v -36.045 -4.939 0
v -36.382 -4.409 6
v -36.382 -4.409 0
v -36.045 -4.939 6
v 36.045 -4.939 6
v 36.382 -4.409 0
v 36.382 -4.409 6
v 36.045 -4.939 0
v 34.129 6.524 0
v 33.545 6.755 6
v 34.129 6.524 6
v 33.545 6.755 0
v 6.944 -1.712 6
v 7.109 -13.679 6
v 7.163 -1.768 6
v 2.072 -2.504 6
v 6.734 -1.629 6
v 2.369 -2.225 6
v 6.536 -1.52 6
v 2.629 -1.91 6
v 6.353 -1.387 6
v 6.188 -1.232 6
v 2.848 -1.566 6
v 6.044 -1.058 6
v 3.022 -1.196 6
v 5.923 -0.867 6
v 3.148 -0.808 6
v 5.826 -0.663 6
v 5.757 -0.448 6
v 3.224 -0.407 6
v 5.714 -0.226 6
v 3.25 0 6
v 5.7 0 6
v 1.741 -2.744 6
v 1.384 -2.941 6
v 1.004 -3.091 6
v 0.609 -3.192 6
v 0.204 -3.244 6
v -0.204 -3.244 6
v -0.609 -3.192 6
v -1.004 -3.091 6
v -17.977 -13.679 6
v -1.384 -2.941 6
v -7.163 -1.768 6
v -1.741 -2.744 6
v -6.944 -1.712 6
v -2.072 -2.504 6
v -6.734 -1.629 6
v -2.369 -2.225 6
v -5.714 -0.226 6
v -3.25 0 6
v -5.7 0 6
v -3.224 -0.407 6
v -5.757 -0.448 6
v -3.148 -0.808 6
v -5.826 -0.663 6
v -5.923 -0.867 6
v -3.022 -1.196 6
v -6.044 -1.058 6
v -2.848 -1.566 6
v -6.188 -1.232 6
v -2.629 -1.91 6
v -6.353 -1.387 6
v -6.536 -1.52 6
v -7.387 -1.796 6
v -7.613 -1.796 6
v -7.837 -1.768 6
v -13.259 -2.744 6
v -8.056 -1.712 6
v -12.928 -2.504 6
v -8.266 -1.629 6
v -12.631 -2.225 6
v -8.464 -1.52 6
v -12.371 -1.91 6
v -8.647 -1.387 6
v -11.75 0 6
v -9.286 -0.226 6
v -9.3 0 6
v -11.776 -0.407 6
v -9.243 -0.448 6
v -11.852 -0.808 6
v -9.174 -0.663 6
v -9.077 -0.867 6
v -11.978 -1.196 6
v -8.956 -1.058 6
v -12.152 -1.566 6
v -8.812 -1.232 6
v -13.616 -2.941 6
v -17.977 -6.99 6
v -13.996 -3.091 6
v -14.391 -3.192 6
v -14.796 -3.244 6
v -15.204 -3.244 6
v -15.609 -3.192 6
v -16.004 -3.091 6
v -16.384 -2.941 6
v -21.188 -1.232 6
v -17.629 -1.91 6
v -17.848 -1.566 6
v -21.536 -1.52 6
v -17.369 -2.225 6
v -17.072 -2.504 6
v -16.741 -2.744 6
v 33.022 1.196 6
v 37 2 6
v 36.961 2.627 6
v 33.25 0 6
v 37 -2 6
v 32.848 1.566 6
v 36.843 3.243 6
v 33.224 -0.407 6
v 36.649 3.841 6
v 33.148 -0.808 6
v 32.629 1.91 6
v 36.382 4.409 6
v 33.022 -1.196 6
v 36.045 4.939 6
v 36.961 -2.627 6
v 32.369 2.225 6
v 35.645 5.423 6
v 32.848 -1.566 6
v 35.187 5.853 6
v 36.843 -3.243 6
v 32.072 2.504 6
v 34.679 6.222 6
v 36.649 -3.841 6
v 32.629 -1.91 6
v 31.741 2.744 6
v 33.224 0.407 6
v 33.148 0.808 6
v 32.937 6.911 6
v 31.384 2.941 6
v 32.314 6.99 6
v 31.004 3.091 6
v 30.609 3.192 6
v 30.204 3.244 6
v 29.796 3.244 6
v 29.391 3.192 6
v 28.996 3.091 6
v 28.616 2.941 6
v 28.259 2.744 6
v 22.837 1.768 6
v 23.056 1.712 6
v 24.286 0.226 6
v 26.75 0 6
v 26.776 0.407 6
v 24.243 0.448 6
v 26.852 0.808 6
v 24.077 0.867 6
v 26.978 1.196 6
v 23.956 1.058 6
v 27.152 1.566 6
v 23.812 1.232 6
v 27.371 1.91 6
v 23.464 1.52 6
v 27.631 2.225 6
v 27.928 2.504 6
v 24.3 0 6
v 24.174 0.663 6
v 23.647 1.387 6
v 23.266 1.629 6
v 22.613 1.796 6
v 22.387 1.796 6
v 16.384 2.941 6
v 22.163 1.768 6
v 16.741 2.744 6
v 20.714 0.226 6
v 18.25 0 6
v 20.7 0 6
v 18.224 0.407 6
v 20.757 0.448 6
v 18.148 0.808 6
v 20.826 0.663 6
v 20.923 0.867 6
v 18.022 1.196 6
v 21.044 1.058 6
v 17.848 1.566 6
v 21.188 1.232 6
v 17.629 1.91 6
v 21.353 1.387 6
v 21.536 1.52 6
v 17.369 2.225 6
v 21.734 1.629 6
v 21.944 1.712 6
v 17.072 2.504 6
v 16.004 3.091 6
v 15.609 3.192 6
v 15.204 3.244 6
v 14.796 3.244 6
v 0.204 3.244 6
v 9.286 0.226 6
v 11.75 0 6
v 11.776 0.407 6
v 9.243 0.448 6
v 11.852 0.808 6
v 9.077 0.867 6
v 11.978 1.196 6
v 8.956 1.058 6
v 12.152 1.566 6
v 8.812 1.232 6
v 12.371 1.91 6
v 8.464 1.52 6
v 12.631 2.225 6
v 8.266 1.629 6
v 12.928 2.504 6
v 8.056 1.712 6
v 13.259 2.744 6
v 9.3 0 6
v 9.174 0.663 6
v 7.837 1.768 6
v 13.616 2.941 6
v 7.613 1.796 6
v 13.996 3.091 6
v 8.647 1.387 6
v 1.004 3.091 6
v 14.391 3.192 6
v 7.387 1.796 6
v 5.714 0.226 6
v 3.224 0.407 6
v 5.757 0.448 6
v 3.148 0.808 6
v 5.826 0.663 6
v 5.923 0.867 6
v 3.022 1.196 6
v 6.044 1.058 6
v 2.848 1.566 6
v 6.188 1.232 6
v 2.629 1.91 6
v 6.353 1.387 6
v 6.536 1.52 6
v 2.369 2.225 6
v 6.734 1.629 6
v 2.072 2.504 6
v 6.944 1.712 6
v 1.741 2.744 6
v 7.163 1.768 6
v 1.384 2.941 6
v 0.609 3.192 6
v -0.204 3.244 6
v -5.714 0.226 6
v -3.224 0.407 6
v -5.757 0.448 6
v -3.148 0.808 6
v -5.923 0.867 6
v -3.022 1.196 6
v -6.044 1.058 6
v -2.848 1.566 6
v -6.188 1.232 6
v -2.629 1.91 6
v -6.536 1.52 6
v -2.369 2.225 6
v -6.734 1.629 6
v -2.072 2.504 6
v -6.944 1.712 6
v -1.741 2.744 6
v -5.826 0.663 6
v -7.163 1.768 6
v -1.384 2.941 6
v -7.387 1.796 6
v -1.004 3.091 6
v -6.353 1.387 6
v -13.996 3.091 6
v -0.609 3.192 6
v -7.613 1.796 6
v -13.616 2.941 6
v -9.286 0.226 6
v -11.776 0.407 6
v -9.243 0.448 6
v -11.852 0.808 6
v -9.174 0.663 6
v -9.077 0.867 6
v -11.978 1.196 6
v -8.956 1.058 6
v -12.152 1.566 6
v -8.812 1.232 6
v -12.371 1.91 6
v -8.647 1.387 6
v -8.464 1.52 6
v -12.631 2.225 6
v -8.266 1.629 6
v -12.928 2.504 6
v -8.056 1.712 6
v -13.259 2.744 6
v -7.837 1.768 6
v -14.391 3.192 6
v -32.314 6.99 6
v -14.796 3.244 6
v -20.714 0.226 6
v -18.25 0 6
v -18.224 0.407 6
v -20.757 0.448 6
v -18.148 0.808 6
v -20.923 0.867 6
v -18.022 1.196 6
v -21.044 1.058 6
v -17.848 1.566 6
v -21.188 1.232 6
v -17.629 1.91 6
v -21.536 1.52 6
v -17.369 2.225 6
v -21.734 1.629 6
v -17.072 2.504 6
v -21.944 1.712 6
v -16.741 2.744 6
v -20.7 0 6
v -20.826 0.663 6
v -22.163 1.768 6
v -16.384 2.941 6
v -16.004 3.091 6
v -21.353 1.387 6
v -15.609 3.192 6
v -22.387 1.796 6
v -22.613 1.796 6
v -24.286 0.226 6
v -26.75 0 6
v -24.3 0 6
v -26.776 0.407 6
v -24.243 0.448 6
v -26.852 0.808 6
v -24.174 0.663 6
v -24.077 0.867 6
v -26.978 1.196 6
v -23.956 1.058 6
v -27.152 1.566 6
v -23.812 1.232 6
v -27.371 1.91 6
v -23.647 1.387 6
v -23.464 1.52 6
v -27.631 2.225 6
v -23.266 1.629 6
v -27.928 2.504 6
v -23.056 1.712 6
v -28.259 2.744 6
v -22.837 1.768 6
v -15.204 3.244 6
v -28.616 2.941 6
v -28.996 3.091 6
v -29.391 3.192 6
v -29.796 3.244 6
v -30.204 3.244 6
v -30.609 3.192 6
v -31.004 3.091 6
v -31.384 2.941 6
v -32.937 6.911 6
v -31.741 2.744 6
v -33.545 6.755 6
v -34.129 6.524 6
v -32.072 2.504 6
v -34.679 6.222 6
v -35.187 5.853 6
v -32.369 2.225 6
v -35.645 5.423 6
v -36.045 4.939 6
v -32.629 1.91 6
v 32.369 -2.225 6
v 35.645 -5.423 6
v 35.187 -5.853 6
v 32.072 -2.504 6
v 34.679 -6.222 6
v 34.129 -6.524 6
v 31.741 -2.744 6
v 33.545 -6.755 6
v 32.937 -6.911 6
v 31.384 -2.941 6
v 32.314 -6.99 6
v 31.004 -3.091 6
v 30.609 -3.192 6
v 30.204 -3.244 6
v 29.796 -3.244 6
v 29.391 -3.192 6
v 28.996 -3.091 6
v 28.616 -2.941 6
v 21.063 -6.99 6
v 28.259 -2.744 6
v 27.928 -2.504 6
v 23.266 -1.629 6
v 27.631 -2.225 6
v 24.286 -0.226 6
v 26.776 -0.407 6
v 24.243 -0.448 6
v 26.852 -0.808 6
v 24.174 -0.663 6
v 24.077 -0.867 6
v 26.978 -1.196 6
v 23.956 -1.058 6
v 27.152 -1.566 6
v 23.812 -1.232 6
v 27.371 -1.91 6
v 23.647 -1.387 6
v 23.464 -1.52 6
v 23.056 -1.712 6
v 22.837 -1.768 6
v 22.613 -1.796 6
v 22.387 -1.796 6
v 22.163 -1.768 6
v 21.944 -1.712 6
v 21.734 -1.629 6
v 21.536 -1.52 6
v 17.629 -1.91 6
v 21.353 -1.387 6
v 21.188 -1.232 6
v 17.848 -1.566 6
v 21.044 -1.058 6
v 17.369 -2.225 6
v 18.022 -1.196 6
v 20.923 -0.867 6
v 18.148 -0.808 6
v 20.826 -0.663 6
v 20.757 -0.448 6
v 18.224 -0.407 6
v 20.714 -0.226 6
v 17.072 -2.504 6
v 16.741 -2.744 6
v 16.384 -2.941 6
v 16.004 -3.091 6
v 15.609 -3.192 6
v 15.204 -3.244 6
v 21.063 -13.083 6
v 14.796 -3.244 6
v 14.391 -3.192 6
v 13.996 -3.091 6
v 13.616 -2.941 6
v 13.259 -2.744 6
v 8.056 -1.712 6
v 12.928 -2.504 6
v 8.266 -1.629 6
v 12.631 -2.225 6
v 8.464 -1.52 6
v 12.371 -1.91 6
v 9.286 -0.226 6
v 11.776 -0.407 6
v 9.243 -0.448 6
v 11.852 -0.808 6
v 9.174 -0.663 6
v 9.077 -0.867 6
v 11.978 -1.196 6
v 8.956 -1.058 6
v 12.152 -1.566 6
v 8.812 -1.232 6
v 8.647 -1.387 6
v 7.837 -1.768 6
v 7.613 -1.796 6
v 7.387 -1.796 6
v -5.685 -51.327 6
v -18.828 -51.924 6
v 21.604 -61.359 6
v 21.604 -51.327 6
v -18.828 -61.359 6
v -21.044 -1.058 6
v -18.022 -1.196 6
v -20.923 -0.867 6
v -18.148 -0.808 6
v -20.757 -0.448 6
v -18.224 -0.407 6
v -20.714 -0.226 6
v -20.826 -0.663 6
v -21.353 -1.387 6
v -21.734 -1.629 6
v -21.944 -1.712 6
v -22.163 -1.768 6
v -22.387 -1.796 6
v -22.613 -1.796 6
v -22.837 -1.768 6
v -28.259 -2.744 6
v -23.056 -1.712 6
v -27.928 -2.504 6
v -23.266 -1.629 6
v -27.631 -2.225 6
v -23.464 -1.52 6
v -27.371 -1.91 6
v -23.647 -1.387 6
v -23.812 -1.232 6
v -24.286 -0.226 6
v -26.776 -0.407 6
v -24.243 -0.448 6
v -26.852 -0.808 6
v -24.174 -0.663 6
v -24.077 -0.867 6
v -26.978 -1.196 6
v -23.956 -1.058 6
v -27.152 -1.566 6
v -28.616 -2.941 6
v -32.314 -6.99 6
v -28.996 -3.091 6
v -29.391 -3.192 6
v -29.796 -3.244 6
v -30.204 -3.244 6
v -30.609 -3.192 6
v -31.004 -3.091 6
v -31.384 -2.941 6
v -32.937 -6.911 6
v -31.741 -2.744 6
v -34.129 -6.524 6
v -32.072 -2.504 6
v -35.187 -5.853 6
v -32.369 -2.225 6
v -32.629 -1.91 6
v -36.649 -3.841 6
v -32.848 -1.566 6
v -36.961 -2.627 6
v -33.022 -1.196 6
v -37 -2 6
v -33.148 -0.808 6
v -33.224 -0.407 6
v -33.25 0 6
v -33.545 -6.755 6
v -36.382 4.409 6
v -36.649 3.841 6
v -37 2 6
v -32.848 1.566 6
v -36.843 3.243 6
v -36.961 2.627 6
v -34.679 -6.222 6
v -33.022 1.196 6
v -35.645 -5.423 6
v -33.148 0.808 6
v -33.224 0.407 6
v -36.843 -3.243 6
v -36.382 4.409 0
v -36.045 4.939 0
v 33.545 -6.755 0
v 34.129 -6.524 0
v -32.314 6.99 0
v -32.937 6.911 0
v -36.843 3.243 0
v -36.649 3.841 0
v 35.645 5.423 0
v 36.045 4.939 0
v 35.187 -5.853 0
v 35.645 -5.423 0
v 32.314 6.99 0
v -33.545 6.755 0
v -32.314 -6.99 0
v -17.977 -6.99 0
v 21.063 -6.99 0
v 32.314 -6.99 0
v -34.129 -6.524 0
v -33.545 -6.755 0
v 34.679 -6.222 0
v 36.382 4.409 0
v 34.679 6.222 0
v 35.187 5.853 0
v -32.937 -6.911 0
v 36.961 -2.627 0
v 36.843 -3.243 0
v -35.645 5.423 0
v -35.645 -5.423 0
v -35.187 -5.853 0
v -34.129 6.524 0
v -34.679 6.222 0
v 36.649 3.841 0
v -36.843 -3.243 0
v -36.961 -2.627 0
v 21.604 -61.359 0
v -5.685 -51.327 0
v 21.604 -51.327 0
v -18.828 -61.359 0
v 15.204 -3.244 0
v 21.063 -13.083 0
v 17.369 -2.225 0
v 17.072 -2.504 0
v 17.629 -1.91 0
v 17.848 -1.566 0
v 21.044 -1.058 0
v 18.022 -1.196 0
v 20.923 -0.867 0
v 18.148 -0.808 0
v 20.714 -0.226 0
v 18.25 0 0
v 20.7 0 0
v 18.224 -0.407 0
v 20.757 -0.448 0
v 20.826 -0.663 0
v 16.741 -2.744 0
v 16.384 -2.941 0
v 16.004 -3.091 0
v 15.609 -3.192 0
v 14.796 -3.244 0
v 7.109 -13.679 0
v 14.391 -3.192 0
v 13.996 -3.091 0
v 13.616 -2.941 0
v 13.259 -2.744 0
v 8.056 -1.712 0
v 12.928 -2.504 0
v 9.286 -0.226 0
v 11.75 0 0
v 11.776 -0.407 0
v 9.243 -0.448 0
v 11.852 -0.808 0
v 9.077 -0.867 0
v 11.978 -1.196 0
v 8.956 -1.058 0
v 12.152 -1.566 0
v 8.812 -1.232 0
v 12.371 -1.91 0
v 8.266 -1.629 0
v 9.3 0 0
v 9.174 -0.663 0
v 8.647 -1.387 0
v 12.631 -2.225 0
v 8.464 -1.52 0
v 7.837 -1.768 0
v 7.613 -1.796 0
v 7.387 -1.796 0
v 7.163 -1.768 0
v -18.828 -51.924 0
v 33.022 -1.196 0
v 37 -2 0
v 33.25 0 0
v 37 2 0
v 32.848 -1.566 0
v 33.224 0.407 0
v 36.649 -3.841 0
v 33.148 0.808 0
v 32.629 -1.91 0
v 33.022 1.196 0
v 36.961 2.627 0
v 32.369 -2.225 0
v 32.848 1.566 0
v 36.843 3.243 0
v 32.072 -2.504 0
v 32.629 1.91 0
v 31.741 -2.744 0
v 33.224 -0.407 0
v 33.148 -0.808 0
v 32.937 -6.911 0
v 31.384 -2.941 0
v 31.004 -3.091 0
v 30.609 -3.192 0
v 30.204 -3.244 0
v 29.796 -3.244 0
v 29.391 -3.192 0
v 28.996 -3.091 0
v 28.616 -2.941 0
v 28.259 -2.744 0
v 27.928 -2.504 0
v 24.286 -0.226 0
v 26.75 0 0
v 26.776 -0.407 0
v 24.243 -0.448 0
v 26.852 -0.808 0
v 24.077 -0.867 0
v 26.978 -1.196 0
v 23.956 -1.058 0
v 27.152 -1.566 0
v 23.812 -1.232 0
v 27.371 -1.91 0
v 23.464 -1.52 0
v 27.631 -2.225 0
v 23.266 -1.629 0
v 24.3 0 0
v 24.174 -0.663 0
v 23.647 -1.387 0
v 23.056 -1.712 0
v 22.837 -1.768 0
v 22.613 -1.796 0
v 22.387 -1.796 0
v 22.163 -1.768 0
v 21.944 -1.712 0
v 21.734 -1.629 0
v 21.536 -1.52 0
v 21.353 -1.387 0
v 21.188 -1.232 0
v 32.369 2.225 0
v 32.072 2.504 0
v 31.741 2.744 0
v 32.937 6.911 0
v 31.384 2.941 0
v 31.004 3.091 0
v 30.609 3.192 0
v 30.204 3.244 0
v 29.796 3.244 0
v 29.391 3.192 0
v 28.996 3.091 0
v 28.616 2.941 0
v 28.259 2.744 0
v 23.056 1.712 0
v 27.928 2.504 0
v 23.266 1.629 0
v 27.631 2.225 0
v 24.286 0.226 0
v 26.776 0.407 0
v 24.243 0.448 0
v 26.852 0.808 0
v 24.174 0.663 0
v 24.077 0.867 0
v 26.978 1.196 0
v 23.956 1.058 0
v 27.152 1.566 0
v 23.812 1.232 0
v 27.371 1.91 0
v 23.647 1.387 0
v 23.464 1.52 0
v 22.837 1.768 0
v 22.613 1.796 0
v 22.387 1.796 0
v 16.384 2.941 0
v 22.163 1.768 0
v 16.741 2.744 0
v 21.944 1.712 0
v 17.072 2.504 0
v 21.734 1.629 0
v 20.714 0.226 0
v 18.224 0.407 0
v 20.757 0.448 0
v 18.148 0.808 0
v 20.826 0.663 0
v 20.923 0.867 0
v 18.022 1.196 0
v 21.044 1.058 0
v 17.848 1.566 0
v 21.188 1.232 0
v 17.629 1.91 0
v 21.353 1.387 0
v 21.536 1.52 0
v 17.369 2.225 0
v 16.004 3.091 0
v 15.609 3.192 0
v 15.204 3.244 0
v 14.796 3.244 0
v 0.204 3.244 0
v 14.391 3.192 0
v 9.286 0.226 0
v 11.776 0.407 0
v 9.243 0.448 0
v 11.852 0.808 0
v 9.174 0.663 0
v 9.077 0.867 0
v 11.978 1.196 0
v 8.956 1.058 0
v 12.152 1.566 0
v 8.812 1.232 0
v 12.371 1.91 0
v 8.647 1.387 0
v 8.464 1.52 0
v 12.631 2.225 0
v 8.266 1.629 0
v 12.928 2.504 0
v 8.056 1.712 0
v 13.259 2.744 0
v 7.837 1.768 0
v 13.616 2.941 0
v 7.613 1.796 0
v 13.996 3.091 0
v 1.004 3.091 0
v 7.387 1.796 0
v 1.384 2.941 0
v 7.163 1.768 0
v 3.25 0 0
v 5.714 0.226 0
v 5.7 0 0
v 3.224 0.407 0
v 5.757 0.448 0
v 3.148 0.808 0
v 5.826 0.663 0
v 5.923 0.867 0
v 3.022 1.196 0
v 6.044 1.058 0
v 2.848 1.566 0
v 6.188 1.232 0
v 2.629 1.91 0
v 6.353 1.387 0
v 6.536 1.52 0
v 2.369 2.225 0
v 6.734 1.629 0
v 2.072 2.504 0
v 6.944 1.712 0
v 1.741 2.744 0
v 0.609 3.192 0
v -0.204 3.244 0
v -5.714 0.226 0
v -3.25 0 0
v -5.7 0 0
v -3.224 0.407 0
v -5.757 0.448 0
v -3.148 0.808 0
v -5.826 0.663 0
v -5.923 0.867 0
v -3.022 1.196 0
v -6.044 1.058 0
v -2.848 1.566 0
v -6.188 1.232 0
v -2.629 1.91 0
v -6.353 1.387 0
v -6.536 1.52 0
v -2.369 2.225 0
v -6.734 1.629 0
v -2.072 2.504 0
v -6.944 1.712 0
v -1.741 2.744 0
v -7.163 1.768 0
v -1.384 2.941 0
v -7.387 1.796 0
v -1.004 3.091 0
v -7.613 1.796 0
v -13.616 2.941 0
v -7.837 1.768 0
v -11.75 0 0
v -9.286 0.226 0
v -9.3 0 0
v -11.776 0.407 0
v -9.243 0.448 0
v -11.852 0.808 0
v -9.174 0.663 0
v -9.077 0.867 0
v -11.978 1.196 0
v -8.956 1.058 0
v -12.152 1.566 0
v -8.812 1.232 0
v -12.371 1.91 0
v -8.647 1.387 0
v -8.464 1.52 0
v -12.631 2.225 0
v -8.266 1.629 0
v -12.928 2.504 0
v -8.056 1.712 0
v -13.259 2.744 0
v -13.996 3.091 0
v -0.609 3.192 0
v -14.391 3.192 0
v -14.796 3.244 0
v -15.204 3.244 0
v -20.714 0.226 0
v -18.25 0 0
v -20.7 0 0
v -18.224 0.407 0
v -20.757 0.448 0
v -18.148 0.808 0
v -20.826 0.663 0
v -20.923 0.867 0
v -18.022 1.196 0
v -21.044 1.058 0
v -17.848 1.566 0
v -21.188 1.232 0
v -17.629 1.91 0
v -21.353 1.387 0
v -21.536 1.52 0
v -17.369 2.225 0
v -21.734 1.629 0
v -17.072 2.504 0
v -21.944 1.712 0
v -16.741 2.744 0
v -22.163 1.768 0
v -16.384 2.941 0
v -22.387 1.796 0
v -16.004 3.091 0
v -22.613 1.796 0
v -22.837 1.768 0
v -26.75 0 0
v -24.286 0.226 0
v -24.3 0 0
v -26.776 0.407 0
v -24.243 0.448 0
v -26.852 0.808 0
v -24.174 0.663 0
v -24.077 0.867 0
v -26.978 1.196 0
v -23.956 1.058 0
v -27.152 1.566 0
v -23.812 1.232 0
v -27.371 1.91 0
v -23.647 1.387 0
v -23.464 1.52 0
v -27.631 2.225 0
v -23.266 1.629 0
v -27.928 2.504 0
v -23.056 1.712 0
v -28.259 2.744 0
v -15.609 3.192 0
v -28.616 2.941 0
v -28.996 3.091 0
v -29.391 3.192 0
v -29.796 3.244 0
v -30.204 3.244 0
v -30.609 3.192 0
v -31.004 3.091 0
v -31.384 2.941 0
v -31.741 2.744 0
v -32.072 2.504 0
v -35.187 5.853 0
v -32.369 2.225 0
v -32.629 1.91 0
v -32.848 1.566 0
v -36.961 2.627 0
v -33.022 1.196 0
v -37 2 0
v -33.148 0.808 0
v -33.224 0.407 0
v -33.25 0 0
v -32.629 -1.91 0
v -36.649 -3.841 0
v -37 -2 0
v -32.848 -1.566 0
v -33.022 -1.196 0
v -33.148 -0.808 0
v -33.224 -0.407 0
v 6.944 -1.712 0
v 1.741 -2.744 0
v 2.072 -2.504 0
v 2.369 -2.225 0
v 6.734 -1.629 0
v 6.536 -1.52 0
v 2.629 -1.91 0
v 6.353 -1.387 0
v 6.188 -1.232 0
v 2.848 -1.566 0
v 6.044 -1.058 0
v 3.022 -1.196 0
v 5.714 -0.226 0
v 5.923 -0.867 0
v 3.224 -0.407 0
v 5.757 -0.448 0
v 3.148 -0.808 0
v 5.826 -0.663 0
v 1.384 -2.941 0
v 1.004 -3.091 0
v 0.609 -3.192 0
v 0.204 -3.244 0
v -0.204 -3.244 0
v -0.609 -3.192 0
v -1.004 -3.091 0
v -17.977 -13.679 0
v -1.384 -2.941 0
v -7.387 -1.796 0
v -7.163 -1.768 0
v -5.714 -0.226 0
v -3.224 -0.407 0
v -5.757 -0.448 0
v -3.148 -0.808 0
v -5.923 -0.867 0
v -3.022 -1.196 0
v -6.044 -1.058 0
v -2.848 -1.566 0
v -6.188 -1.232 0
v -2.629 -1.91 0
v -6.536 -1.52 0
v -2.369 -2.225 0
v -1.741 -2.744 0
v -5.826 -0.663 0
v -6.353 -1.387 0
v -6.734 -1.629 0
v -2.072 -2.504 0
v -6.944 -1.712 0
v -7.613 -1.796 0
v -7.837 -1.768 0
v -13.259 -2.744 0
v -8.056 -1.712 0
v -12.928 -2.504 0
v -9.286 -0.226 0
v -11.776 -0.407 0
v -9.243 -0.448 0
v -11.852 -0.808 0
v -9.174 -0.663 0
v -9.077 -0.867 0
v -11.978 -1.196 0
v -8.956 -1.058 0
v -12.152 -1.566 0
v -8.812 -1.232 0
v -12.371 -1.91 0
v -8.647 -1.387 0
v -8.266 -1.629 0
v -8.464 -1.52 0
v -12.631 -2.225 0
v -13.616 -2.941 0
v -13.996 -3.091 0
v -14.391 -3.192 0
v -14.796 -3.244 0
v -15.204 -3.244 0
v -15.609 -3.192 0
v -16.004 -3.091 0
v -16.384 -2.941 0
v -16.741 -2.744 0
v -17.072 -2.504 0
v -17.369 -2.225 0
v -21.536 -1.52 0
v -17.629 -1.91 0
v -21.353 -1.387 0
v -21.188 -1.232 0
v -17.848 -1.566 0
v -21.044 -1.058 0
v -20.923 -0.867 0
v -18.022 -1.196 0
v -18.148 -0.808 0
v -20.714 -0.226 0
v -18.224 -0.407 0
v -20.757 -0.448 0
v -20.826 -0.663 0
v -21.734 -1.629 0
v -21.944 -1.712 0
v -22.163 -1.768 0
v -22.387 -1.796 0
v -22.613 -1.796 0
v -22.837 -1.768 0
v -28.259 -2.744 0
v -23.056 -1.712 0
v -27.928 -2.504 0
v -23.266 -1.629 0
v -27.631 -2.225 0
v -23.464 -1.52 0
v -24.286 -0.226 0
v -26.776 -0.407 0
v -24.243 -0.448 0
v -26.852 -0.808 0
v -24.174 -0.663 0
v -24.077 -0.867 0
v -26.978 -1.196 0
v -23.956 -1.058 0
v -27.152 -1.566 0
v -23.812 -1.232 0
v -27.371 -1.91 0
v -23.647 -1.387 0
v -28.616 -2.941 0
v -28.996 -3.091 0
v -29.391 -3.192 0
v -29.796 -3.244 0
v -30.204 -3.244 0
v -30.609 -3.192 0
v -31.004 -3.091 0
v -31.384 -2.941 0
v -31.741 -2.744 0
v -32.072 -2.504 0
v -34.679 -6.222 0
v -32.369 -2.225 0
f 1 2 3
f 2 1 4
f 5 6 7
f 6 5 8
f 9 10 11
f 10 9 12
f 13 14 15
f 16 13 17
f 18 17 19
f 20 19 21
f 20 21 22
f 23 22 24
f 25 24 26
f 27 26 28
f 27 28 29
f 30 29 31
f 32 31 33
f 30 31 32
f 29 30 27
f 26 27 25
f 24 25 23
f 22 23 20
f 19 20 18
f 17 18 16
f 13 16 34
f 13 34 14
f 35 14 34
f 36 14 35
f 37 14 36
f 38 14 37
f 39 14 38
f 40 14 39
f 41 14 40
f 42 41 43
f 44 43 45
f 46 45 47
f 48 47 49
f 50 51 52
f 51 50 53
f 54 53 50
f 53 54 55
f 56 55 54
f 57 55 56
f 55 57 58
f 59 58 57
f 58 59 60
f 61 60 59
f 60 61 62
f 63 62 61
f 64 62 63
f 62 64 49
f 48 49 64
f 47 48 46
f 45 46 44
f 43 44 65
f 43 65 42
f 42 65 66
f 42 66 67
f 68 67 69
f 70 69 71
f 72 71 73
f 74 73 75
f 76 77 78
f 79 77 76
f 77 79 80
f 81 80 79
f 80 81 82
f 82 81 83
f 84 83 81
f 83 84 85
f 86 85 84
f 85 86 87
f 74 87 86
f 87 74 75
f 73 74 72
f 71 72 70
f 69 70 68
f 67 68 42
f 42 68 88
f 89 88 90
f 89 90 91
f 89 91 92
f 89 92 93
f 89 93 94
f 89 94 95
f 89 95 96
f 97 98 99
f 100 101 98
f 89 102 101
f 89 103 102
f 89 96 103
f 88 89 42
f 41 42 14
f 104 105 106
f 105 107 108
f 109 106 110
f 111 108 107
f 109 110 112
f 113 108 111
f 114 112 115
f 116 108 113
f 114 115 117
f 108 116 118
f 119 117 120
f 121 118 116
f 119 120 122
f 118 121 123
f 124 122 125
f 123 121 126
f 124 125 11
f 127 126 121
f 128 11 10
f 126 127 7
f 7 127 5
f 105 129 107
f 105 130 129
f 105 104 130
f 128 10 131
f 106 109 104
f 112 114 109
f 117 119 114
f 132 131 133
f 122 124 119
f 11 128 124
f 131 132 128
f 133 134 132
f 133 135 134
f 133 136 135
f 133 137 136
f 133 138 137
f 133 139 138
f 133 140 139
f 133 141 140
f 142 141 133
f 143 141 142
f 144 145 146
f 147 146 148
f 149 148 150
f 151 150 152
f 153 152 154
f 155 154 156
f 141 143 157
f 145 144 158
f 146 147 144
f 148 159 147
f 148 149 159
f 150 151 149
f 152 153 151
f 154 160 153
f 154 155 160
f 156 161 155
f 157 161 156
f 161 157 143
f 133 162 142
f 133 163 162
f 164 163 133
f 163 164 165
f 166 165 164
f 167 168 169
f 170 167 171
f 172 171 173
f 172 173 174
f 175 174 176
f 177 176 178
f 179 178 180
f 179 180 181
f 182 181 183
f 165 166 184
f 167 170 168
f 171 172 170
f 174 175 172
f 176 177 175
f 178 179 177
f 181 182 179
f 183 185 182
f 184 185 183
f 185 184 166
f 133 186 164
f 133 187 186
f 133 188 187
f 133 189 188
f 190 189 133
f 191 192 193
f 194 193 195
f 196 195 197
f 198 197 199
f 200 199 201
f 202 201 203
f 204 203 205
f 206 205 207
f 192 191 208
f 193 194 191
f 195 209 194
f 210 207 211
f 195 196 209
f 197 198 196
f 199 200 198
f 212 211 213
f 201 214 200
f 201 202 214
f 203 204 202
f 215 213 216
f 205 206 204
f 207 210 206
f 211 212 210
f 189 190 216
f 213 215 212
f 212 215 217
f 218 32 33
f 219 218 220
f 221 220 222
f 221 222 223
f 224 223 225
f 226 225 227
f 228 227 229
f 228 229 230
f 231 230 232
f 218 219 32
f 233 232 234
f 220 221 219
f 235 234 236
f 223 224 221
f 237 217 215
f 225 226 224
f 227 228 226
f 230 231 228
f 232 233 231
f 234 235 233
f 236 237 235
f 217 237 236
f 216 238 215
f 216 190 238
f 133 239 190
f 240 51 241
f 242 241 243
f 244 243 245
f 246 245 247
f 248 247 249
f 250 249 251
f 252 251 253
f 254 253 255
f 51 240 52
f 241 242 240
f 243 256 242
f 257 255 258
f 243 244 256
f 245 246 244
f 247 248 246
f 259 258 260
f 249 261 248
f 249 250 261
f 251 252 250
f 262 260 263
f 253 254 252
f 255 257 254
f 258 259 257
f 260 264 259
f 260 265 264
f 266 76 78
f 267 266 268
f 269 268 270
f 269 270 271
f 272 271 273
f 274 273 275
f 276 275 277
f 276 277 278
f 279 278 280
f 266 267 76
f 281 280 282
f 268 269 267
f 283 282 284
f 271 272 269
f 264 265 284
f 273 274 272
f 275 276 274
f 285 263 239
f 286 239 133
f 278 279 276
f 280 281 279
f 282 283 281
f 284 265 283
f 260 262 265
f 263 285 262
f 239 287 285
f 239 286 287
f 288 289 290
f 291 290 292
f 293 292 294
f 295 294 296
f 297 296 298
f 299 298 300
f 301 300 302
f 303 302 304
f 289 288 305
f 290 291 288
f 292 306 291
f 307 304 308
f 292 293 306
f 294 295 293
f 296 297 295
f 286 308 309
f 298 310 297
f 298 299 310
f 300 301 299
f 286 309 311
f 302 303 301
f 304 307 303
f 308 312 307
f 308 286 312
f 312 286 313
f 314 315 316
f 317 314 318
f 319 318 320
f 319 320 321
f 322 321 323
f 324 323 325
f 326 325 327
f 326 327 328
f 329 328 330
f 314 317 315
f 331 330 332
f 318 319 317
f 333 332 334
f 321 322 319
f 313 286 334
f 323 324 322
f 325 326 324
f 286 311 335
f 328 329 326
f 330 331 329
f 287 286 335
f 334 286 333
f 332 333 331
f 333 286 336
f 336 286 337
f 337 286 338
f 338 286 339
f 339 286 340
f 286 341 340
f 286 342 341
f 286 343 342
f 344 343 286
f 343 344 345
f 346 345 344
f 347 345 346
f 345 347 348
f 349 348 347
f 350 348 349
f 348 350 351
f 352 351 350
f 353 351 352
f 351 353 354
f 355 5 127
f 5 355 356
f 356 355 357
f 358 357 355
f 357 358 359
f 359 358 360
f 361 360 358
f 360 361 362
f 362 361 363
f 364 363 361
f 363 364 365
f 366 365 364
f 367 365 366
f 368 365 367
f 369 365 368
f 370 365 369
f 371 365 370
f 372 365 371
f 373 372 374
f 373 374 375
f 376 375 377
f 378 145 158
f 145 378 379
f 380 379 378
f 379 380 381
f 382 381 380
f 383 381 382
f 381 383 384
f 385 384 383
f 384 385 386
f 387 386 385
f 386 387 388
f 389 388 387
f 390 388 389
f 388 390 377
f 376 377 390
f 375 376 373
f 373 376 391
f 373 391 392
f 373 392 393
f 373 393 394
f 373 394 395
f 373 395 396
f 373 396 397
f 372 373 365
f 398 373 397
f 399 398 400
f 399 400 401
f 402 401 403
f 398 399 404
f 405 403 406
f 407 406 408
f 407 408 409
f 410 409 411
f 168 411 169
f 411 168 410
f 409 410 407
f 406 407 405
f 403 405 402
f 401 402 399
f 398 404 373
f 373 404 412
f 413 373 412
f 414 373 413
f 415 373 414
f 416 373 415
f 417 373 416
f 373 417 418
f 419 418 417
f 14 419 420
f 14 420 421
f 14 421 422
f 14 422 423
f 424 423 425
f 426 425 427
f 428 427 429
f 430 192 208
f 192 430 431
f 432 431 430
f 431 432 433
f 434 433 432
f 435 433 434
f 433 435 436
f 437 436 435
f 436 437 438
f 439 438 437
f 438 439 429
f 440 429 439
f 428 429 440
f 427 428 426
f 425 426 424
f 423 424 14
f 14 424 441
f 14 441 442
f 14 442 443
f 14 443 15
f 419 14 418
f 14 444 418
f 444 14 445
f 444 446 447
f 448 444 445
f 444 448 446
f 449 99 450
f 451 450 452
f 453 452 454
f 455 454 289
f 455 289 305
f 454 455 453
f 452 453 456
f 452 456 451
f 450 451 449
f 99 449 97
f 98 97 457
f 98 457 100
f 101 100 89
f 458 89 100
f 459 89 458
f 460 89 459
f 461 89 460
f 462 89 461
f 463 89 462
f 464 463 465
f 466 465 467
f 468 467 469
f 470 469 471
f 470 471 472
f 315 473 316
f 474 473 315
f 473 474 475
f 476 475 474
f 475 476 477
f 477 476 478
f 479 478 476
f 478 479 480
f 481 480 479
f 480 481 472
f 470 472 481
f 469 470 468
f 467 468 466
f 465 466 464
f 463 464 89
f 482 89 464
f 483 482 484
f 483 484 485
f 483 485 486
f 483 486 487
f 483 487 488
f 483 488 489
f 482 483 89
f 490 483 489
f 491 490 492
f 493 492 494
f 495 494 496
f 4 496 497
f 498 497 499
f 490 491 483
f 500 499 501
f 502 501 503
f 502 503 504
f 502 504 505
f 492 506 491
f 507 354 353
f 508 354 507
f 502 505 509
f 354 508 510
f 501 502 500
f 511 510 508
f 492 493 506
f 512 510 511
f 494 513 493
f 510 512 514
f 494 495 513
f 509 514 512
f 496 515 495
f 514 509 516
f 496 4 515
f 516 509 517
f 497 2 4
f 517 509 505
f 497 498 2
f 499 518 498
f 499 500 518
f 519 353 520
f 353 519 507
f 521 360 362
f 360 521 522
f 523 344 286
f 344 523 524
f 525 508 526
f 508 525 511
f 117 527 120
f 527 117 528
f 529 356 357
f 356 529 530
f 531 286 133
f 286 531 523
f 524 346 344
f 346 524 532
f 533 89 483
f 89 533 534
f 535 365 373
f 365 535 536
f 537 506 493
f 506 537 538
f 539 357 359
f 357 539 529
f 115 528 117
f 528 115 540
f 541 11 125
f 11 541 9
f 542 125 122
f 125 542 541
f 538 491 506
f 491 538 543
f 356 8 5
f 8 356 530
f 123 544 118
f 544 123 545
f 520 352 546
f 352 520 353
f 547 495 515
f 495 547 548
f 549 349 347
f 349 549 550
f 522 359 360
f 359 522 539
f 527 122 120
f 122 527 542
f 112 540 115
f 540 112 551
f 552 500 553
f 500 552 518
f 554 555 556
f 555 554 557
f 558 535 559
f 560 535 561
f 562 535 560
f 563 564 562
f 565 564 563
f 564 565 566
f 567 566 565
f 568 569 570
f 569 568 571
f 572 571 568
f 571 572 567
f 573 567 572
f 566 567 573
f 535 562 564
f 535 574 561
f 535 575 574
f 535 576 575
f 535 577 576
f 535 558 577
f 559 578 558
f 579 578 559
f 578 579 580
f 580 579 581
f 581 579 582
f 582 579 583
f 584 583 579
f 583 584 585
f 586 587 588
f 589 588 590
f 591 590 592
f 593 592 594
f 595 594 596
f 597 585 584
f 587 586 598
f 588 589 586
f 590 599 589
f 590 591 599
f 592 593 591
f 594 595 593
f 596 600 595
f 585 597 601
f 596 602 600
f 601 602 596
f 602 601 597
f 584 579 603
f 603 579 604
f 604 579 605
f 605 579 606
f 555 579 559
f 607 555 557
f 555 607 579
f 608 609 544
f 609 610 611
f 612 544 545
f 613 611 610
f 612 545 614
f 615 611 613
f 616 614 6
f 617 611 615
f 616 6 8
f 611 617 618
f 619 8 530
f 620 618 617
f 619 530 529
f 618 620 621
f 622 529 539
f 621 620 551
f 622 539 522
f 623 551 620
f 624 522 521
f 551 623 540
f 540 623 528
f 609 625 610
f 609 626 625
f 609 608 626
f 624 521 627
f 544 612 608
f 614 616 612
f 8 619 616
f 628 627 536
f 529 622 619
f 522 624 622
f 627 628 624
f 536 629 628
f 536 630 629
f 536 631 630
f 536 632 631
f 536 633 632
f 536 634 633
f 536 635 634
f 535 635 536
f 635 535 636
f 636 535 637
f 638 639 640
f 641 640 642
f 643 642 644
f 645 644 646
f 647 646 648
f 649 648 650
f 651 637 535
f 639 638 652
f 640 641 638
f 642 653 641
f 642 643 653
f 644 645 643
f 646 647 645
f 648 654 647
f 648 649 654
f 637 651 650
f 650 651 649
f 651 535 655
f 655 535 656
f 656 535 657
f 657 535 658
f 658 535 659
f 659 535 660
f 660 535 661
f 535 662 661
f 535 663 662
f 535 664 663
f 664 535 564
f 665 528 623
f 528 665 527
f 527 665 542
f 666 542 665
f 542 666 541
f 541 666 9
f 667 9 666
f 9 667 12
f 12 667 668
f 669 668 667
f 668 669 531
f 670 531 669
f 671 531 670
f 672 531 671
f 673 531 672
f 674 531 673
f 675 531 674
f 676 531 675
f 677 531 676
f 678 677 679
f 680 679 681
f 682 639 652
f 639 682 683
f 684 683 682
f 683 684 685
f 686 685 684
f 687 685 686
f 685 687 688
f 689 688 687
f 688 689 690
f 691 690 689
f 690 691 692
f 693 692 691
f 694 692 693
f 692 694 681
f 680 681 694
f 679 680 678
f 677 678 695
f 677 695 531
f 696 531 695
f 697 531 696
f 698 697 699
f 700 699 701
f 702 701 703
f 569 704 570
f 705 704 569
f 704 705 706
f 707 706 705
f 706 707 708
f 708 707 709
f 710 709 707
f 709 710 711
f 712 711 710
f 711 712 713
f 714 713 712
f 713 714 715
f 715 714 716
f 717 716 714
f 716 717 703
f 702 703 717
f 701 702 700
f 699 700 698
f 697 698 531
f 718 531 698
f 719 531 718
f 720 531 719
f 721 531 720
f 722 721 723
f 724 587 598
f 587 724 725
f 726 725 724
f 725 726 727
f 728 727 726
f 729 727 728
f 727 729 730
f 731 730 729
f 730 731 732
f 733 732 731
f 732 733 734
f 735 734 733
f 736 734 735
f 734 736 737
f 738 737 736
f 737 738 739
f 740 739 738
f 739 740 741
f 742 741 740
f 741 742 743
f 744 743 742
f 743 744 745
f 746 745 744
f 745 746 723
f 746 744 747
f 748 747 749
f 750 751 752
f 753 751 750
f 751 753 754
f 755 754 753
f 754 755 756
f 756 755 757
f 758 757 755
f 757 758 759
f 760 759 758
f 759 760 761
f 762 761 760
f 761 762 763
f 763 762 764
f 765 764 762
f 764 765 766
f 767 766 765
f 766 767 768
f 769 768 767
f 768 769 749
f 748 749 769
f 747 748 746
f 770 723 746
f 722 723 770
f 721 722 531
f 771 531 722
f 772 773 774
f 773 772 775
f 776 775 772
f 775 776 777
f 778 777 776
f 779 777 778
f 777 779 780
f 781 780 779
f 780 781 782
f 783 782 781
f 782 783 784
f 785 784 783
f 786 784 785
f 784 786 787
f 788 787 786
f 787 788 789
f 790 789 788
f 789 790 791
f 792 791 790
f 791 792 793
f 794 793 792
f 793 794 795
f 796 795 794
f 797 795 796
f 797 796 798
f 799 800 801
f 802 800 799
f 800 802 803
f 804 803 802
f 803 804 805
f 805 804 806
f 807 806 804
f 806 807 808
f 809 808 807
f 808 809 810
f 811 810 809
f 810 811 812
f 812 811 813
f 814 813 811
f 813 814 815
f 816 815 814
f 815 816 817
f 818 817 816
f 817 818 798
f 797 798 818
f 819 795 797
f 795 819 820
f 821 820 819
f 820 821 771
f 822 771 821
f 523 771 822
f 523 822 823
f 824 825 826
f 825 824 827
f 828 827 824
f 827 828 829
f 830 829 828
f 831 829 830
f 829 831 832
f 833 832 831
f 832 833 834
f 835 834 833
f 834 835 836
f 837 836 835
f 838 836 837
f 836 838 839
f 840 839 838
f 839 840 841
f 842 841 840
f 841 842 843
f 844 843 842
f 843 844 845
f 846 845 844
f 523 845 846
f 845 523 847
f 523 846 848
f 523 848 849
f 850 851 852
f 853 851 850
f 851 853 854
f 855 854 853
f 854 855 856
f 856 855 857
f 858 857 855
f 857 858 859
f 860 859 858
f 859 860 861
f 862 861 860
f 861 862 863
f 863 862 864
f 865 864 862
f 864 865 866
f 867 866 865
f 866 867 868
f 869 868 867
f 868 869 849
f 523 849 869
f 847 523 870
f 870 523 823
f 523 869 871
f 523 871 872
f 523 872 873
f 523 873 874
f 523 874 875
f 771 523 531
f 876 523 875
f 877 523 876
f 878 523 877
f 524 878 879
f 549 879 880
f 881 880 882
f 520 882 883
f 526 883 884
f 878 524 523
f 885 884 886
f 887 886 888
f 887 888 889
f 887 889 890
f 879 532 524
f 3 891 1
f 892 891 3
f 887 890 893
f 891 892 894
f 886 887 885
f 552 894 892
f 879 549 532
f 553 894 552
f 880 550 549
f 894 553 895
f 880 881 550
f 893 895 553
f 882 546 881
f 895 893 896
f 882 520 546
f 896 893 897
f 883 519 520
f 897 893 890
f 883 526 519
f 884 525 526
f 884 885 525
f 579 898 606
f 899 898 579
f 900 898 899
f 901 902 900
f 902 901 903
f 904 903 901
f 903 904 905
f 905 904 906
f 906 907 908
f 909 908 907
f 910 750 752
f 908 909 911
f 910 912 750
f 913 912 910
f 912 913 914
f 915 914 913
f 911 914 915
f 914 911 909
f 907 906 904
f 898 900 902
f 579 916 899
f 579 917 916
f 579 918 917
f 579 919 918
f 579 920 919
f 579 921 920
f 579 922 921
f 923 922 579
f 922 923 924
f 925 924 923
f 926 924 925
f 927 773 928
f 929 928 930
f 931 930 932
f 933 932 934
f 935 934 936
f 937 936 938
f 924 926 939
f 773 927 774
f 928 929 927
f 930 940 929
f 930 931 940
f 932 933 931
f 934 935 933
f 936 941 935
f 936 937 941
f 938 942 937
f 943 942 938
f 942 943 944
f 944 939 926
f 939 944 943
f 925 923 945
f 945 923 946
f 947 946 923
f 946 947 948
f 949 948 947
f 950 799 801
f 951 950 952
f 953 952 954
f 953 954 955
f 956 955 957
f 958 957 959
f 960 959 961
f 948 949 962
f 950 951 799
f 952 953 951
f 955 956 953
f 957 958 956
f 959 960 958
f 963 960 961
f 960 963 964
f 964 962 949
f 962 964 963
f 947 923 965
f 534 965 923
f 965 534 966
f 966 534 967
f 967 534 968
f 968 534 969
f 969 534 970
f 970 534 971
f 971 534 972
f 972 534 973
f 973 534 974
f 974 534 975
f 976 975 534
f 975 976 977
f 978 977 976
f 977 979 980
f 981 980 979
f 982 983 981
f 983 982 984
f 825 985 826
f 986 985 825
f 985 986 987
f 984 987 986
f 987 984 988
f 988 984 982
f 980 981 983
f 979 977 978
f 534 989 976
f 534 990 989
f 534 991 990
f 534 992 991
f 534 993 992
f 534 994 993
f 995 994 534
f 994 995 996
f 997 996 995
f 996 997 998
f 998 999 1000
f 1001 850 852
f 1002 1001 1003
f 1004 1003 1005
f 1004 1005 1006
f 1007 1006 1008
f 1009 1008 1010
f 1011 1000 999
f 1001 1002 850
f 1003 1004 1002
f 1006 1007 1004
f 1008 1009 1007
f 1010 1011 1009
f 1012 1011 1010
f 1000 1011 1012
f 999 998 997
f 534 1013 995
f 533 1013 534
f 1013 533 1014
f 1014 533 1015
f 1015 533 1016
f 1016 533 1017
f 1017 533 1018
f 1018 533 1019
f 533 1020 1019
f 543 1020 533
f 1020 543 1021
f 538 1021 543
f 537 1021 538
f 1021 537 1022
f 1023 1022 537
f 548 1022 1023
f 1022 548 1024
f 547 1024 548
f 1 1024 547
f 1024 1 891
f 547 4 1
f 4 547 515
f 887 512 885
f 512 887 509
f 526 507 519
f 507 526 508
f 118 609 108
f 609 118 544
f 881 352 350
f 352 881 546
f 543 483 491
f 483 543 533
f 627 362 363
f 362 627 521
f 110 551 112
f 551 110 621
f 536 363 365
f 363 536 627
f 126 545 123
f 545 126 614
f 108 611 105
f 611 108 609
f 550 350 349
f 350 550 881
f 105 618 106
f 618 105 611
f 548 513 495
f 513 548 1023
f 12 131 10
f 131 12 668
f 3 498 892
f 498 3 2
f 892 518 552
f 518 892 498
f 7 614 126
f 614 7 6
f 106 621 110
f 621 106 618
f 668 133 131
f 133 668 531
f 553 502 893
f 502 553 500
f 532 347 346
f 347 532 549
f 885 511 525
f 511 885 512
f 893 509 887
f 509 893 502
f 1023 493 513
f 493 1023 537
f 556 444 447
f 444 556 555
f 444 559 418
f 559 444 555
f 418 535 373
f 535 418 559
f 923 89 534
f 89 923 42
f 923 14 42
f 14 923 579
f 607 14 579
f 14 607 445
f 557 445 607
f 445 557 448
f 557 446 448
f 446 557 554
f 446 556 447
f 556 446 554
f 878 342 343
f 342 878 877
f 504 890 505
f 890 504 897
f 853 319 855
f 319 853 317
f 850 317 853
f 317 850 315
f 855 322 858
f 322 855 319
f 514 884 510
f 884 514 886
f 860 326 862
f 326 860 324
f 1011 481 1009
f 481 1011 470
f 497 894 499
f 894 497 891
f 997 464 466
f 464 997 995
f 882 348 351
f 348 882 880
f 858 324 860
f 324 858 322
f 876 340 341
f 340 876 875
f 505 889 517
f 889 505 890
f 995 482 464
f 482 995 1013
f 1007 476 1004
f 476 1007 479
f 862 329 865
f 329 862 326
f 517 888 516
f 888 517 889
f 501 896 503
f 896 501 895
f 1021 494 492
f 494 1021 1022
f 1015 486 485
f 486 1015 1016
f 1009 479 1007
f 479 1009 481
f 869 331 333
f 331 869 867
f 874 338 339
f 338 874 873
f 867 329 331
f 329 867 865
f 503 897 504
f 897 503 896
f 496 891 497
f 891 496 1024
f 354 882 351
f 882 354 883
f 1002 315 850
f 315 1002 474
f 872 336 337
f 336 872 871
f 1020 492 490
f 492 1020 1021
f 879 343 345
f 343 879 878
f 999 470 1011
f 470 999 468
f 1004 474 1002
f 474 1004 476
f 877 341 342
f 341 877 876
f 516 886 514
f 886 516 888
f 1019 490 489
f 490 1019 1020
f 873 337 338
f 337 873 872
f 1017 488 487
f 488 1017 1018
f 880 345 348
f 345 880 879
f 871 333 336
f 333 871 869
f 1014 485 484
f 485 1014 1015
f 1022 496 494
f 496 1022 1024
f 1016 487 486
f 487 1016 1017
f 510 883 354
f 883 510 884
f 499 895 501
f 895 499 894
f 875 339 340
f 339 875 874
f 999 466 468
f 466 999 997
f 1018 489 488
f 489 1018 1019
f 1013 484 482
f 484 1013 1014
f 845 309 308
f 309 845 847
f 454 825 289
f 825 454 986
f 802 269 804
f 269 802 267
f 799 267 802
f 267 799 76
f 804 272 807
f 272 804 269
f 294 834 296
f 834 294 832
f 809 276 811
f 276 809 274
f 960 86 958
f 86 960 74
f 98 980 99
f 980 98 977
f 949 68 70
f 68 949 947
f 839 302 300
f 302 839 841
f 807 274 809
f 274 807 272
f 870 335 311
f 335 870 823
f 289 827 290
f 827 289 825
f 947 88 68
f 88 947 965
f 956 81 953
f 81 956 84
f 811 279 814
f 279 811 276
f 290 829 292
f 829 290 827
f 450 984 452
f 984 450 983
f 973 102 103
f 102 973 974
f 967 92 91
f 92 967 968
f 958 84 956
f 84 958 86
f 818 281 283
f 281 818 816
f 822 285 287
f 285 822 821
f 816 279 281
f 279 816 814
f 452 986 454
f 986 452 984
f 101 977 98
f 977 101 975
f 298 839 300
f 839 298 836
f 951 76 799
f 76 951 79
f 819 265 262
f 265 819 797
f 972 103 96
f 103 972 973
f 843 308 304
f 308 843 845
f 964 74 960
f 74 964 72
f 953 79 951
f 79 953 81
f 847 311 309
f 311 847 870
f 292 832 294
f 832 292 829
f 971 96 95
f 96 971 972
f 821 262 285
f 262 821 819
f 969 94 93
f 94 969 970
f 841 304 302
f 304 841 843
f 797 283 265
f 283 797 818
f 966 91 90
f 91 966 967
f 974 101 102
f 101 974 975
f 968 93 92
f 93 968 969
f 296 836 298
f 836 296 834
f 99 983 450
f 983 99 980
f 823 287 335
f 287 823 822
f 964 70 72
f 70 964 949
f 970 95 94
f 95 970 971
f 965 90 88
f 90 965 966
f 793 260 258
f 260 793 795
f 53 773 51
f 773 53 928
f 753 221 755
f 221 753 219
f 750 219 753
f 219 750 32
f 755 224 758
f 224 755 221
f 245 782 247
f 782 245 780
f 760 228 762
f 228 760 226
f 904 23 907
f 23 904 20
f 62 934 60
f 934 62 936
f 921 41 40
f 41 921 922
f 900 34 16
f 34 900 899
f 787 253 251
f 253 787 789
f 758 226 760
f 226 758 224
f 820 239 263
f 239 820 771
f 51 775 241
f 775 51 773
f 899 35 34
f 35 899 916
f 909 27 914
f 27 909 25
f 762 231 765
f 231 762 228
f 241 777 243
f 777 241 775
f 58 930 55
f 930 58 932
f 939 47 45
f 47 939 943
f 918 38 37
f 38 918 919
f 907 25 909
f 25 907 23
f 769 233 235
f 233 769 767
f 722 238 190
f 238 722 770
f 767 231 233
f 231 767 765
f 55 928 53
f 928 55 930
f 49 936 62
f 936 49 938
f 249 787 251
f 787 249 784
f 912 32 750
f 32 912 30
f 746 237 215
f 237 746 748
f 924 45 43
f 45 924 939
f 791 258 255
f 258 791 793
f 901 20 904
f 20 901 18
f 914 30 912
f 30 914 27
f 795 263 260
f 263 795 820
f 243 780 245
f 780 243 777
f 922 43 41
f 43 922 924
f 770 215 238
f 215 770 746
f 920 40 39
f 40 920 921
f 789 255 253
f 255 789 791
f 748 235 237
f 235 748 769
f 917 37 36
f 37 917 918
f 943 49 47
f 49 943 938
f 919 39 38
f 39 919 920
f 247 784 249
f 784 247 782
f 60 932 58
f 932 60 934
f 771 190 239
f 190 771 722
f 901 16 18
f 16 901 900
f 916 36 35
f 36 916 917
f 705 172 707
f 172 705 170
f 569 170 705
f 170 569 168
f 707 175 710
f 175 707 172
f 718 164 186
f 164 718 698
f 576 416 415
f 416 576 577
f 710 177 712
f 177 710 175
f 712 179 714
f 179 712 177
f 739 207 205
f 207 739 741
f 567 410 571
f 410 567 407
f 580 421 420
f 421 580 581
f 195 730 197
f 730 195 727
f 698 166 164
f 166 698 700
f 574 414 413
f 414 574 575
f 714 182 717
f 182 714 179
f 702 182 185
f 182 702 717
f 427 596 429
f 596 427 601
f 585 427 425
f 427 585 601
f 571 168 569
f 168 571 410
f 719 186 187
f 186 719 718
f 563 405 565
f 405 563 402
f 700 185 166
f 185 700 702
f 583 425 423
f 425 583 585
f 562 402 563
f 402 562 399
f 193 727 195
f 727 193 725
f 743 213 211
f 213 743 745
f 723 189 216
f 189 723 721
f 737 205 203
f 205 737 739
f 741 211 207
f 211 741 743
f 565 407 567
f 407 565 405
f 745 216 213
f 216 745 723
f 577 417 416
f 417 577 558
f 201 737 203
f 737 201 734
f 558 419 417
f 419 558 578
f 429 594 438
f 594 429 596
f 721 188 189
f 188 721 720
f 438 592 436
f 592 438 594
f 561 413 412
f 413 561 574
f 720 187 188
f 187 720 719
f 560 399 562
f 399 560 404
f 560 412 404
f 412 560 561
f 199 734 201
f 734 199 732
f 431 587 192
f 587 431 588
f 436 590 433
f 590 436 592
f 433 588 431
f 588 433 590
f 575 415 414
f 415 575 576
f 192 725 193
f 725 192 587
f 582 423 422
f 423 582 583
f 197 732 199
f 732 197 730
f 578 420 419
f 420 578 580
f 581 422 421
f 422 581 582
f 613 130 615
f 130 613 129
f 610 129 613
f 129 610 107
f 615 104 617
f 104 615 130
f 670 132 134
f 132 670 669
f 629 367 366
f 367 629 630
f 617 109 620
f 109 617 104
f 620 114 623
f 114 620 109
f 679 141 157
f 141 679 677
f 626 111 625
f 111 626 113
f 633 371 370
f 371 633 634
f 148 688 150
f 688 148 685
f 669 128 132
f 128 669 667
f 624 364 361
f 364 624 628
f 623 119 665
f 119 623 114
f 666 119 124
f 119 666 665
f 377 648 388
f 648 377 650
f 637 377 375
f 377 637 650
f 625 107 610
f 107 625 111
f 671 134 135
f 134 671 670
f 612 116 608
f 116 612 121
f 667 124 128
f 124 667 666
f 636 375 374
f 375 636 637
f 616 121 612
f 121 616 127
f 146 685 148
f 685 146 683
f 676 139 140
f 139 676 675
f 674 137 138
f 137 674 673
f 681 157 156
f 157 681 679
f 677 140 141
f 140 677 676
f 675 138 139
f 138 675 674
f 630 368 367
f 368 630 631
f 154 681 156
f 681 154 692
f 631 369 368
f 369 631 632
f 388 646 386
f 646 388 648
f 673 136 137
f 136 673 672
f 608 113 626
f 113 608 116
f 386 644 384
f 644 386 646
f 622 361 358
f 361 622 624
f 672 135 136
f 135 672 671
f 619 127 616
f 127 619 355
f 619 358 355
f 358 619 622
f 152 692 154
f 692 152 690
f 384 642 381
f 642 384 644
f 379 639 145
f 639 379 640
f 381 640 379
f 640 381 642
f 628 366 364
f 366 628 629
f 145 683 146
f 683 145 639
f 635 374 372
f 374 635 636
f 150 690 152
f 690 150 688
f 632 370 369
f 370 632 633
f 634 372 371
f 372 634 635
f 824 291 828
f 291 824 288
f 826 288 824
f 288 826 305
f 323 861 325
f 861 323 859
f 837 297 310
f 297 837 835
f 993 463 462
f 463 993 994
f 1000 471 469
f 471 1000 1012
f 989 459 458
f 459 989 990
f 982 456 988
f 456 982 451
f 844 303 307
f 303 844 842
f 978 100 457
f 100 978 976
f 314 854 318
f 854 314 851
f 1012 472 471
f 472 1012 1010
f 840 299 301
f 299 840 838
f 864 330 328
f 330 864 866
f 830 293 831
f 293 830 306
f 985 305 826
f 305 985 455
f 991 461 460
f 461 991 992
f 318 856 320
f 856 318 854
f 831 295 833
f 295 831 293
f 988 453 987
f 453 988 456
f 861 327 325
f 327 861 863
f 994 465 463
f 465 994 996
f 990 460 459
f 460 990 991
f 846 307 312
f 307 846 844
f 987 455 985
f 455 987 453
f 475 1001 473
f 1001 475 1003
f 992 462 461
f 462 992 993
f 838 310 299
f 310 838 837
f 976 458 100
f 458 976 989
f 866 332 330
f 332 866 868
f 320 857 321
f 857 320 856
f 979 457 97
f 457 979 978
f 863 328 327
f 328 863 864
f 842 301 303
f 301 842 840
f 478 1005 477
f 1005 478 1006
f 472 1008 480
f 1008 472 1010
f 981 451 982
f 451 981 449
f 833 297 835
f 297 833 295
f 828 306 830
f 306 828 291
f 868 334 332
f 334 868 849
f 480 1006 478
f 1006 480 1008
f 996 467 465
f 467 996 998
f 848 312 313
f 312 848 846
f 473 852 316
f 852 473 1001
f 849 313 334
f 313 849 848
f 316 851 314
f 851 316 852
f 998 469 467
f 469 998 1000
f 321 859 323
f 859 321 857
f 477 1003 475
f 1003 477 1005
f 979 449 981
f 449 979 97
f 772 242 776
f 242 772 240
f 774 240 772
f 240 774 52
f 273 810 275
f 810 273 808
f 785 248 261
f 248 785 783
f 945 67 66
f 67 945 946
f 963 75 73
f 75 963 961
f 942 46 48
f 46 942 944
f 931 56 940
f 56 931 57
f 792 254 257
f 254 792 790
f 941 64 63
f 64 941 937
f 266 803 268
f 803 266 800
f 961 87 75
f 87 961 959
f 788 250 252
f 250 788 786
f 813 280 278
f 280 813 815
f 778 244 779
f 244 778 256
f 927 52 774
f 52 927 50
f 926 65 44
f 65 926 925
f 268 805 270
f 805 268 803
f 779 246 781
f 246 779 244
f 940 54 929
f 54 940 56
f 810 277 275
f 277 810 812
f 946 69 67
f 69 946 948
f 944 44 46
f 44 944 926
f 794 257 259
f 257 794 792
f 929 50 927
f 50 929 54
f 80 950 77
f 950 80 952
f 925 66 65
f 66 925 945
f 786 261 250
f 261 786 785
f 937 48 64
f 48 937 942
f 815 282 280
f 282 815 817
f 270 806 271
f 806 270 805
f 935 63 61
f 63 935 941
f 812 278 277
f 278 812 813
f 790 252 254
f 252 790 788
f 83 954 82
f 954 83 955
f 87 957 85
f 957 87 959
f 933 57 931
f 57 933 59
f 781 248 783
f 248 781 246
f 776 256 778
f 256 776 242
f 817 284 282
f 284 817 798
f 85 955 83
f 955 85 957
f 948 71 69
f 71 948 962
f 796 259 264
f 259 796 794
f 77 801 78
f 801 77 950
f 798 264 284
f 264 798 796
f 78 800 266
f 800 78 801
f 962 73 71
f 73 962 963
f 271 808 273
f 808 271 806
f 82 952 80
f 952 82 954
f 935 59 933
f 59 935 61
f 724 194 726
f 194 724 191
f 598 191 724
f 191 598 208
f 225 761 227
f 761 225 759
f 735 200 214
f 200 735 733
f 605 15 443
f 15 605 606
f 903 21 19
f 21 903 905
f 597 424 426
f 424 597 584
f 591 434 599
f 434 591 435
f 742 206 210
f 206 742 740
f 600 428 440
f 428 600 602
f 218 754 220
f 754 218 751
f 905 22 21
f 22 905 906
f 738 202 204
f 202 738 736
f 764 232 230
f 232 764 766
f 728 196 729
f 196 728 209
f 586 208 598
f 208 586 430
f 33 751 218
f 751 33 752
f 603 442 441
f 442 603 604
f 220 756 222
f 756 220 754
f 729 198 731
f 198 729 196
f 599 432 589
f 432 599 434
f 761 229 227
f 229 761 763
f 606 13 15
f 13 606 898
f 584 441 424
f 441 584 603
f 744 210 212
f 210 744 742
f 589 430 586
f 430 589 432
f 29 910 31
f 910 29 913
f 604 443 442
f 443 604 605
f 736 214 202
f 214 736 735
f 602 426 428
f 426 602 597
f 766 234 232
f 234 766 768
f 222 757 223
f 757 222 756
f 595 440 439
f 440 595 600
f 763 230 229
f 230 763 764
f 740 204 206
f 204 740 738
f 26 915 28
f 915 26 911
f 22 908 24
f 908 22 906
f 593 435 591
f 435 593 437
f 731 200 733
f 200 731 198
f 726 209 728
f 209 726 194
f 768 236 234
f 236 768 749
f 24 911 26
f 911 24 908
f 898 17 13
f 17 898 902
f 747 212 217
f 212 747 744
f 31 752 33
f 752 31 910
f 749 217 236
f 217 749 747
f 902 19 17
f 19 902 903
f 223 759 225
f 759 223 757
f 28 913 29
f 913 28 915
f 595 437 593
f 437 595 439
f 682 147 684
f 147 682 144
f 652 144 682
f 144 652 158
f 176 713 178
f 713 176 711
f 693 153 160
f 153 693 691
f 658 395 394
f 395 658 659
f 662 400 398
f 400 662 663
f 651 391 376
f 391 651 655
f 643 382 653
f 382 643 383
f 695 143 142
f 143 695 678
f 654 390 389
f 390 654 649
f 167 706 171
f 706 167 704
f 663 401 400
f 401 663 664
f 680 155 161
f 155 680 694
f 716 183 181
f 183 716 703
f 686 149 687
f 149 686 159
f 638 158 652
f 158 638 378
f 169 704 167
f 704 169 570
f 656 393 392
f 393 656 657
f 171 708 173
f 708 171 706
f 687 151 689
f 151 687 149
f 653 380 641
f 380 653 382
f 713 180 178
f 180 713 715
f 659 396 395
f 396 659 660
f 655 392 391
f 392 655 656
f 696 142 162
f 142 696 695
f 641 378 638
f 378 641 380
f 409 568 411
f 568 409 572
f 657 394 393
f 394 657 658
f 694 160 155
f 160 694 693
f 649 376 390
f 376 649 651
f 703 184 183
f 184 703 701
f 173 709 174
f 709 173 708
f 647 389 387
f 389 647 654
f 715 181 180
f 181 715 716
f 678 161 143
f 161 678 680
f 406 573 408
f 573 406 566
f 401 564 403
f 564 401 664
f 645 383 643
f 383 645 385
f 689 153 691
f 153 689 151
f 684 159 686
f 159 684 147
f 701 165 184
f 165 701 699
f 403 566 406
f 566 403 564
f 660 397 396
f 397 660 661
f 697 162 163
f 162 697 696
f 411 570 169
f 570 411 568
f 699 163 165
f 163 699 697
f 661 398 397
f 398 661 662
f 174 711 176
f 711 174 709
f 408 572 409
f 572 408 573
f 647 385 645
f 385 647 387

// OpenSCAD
$fn = 50;


difference() {
	union() {
		hull() {
			translate(v = [-32.0000000000, 2.0000000000, 0]) {
				cylinder(h = 6, r = 5);
			}
			translate(v = [32.0000000000, 2.0000000000, 0]) {
				cylinder(h = 6, r = 5);
			}
			translate(v = [-32.0000000000, -2.0000000000, 0]) {
				cylinder(h = 6, r = 5);
			}
			translate(v = [32.0000000000, -2.0000000000, 0]) {
				cylinder(h = 6, r = 5);
			}
		}
		translate(v = [0, -5, 0]) {
			linear_extrude(height = 6) {
				text(font = "DejaVu Sans Mono:style=Bold", halign = "center", size = 57.0000000000, text = "Z", valign = "top");
			}
		}
	}
	union() {
		translate(v = [-30.0000000000, 0.0000000000, 0]) {
			translate(v = [0, 0, -100]) {
				cylinder(h = 200, r = 3.2500000000);
			}
		}
		translate(v = [-15.0000000000, 0.0000000000, 0]) {
			translate(v = [0, 0, -100]) {
				cylinder(h = 200, r = 3.2500000000);
			}
		}
		translate(v = [0, 0, -100]) {
			cylinder(h = 200, r = 3.2500000000);
		}
		translate(v = [15.0000000000, 0.0000000000, 0]) {
			translate(v = [0, 0, -100]) {
				cylinder(h = 200, r = 3.2500000000);
			}
		}
		translate(v = [30.0000000000, 0.0000000000, 0]) {
			translate(v = [0, 0, -100]) {
				cylinder(h = 200, r = 3.2500000000);
			}
		}
		translate(v = [-30.0000000000, 0.0000000000, 0]) {
			translate(v = [0, 0, -100]) {
				cylinder(h = 200, r = 1.8000000000);
			}
		}
		translate(v = [-22.5000000000, 0.0000000000, 0]) {
			translate(v = [0, 0, -100]) {
				cylinder(h = 200, r = 1.8000000000);
			}
		}
		translate(v = [-15.0000000000, 0.0000000000, 0]) {
			translate(v = [0, 0, -100]) {
				cylinder(h = 200, r = 1.8000000000);
			}
		}
		translate(v = [-7.5000000000, 0.0000000000, 0]) {
			translate(v = [0, 0, -100]) {
				cylinder(h = 200, r = 1.8000000000);
			}
		}
		translate(v = [0, 0, -100]) {
			cylinder(h = 200, r = 1.8000000000);
		}
		translate(v = [7.5000000000, 0.0000000000, 0]) {
			translate(v = [0, 0, -100]) {
				cylinder(h = 200, r = 1.8000000000);
			}
		}
		translate(v = [15.0000000000, 0.0000000000, 0]) {
			translate(v = [0, 0, -100]) {
				cylinder(h = 200, r = 1.8000000000);
			}
		}
		translate(v = [22.5000000000, 0.0000000000, 0]) {
			translate(v = [0, 0, -100]) {
				cylinder(h = 200, r = 1.8000000000);
			}
		}
		translate(v = [30.0000000000, 0.0000000000, 0]) {
			translate(v = [0, 0, -100]) {
				cylinder(h = 200, r = 1.8000000000);
			}
		}
	}
}
